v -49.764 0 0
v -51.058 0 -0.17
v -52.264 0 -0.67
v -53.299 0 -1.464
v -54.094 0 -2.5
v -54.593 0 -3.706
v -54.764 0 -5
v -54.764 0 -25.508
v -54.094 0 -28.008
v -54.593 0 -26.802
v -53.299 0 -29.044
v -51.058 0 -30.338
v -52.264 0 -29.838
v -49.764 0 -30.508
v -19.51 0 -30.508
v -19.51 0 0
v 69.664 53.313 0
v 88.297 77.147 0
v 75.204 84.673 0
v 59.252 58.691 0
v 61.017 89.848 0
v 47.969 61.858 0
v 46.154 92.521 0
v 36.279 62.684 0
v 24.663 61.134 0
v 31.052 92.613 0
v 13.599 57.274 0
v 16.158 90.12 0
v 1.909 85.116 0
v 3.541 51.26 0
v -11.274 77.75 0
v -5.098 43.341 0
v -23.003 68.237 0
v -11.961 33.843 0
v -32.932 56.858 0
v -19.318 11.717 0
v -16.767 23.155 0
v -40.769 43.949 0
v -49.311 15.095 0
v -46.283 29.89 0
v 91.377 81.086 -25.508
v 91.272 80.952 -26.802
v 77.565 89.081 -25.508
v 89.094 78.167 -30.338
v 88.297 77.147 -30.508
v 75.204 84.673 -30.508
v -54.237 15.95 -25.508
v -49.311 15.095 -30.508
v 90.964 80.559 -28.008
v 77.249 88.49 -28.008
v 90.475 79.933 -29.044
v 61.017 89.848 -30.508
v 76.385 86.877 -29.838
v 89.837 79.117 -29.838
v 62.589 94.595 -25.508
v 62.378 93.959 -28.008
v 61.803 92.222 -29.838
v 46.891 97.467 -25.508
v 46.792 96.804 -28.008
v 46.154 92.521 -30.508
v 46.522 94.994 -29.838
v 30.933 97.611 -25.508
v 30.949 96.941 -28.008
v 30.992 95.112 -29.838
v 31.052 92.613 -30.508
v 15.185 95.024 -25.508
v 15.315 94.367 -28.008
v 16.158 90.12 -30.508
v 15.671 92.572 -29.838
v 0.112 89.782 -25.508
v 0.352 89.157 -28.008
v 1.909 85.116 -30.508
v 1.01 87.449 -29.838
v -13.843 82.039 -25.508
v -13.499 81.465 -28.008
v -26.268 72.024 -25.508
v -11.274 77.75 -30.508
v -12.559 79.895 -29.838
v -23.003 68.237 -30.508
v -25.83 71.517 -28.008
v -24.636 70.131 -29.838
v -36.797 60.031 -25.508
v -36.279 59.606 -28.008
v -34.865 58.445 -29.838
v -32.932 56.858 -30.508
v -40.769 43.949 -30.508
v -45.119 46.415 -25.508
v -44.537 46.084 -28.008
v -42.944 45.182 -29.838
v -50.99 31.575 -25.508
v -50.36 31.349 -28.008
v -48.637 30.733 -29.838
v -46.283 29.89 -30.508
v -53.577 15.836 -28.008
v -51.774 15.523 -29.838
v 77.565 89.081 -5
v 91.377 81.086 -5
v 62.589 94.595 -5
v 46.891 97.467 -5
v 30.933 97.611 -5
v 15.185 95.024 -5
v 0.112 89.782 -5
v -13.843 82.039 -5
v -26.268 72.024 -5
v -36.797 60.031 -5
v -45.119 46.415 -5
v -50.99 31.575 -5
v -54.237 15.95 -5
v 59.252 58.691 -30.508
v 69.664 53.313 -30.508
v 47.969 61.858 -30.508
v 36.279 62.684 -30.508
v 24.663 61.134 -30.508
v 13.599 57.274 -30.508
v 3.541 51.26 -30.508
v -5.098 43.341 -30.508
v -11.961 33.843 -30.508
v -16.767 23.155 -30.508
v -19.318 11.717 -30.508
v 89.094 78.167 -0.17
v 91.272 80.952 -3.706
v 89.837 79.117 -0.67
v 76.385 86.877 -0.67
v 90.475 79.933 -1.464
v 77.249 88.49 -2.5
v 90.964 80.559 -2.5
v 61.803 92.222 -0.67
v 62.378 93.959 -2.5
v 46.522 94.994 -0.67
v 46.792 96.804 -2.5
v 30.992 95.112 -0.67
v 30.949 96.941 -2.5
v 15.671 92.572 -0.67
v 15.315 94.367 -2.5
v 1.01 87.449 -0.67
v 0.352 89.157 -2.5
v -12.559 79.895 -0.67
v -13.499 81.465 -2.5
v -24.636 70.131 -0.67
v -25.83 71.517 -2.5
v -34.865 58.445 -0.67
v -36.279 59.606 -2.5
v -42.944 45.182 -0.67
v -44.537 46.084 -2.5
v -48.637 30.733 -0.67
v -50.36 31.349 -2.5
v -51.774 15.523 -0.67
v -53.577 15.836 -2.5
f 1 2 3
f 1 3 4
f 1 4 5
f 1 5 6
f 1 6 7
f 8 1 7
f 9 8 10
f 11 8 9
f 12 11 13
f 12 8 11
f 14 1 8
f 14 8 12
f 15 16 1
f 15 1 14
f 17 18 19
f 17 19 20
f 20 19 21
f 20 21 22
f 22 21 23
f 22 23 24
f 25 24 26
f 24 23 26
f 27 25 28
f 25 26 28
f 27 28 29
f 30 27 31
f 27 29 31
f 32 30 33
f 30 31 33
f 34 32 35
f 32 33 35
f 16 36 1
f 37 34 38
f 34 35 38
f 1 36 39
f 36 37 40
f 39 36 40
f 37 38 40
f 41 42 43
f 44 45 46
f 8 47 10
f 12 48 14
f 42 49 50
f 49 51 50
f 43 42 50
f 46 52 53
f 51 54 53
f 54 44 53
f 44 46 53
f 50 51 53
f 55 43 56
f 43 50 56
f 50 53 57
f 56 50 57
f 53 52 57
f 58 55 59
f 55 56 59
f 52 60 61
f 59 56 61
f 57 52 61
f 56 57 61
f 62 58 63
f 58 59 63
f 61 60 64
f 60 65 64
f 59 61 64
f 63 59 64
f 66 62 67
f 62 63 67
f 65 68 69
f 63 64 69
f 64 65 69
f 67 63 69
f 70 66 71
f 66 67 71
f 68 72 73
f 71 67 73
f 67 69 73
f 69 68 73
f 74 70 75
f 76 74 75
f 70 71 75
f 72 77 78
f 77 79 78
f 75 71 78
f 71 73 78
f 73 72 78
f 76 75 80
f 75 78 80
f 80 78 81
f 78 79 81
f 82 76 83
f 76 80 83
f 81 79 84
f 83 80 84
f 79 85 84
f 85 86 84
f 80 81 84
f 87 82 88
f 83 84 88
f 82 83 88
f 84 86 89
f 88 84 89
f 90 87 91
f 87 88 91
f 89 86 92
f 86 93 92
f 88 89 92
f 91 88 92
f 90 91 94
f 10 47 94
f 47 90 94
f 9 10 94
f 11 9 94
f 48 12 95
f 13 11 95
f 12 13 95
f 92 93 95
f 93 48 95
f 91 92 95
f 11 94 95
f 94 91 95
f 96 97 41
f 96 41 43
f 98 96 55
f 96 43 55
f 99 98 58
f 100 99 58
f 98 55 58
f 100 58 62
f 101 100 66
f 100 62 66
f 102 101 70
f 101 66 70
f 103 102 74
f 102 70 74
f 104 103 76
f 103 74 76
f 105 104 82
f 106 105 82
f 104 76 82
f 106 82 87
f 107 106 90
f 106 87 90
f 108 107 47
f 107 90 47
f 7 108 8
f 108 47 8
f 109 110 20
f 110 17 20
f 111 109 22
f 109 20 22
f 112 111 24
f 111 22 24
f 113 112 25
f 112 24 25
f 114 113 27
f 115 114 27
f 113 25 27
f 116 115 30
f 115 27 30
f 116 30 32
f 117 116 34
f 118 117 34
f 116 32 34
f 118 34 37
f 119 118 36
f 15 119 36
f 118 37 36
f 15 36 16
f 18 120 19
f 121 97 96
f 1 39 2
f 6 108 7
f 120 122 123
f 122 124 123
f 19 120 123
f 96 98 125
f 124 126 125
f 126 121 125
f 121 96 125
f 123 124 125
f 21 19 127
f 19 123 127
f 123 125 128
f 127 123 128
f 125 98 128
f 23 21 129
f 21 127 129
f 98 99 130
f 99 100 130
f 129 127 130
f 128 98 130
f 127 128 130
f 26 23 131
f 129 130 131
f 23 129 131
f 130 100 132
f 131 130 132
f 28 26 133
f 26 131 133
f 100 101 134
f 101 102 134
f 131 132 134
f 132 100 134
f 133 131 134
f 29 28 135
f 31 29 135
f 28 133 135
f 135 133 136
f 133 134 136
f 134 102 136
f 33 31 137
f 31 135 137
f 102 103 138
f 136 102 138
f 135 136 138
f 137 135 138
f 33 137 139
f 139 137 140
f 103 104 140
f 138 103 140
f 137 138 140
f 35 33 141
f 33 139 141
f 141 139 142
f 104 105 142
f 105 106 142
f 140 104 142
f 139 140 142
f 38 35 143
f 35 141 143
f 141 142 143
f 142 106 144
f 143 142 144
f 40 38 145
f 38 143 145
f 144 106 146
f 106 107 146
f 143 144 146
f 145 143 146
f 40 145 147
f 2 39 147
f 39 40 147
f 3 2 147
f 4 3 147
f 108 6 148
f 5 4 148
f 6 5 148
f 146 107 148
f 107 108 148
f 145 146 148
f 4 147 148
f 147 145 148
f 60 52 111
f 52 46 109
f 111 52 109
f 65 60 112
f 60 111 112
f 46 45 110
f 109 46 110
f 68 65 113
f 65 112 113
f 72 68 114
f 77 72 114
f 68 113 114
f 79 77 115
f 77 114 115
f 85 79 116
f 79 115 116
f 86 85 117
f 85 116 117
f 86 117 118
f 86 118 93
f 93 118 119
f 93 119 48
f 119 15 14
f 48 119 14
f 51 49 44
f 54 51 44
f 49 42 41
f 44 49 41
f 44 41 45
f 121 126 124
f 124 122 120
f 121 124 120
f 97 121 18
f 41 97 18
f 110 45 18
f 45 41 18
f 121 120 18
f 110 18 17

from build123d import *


with BuildPart() as f2:
    # F2: sweep along a path in F1
    with BuildLine(Plane.XY) as f2_path:
        ThreePointArc((69.70714, 53.368706), (8.386043, 54.585932), (-19.580629, 0))
    # F0 (on Front) → F2 (sweep)
    with BuildSketch(Plane.XZ):
        with BuildLine():
            Line((-19.510009, 0), (-49.763733, 0))
            ThreePointArc((-49.763733, 0), (-53.299267, -1.464466), (-54.763733, -5))
            Line((-54.763733, -5), (-54.763733, -25.508031))
            ThreePointArc((-54.763733, -25.508031), (-53.299267, -29.043565), (-49.763733, -30.508031))
            Line((-49.763733, -30.508031), (-19.510009, -30.508031))
            Line((-19.510009, -30.508031), (-19.510009, 0))
        make_face()
    sweep(path=f2_path.line)


solid = f2.part
